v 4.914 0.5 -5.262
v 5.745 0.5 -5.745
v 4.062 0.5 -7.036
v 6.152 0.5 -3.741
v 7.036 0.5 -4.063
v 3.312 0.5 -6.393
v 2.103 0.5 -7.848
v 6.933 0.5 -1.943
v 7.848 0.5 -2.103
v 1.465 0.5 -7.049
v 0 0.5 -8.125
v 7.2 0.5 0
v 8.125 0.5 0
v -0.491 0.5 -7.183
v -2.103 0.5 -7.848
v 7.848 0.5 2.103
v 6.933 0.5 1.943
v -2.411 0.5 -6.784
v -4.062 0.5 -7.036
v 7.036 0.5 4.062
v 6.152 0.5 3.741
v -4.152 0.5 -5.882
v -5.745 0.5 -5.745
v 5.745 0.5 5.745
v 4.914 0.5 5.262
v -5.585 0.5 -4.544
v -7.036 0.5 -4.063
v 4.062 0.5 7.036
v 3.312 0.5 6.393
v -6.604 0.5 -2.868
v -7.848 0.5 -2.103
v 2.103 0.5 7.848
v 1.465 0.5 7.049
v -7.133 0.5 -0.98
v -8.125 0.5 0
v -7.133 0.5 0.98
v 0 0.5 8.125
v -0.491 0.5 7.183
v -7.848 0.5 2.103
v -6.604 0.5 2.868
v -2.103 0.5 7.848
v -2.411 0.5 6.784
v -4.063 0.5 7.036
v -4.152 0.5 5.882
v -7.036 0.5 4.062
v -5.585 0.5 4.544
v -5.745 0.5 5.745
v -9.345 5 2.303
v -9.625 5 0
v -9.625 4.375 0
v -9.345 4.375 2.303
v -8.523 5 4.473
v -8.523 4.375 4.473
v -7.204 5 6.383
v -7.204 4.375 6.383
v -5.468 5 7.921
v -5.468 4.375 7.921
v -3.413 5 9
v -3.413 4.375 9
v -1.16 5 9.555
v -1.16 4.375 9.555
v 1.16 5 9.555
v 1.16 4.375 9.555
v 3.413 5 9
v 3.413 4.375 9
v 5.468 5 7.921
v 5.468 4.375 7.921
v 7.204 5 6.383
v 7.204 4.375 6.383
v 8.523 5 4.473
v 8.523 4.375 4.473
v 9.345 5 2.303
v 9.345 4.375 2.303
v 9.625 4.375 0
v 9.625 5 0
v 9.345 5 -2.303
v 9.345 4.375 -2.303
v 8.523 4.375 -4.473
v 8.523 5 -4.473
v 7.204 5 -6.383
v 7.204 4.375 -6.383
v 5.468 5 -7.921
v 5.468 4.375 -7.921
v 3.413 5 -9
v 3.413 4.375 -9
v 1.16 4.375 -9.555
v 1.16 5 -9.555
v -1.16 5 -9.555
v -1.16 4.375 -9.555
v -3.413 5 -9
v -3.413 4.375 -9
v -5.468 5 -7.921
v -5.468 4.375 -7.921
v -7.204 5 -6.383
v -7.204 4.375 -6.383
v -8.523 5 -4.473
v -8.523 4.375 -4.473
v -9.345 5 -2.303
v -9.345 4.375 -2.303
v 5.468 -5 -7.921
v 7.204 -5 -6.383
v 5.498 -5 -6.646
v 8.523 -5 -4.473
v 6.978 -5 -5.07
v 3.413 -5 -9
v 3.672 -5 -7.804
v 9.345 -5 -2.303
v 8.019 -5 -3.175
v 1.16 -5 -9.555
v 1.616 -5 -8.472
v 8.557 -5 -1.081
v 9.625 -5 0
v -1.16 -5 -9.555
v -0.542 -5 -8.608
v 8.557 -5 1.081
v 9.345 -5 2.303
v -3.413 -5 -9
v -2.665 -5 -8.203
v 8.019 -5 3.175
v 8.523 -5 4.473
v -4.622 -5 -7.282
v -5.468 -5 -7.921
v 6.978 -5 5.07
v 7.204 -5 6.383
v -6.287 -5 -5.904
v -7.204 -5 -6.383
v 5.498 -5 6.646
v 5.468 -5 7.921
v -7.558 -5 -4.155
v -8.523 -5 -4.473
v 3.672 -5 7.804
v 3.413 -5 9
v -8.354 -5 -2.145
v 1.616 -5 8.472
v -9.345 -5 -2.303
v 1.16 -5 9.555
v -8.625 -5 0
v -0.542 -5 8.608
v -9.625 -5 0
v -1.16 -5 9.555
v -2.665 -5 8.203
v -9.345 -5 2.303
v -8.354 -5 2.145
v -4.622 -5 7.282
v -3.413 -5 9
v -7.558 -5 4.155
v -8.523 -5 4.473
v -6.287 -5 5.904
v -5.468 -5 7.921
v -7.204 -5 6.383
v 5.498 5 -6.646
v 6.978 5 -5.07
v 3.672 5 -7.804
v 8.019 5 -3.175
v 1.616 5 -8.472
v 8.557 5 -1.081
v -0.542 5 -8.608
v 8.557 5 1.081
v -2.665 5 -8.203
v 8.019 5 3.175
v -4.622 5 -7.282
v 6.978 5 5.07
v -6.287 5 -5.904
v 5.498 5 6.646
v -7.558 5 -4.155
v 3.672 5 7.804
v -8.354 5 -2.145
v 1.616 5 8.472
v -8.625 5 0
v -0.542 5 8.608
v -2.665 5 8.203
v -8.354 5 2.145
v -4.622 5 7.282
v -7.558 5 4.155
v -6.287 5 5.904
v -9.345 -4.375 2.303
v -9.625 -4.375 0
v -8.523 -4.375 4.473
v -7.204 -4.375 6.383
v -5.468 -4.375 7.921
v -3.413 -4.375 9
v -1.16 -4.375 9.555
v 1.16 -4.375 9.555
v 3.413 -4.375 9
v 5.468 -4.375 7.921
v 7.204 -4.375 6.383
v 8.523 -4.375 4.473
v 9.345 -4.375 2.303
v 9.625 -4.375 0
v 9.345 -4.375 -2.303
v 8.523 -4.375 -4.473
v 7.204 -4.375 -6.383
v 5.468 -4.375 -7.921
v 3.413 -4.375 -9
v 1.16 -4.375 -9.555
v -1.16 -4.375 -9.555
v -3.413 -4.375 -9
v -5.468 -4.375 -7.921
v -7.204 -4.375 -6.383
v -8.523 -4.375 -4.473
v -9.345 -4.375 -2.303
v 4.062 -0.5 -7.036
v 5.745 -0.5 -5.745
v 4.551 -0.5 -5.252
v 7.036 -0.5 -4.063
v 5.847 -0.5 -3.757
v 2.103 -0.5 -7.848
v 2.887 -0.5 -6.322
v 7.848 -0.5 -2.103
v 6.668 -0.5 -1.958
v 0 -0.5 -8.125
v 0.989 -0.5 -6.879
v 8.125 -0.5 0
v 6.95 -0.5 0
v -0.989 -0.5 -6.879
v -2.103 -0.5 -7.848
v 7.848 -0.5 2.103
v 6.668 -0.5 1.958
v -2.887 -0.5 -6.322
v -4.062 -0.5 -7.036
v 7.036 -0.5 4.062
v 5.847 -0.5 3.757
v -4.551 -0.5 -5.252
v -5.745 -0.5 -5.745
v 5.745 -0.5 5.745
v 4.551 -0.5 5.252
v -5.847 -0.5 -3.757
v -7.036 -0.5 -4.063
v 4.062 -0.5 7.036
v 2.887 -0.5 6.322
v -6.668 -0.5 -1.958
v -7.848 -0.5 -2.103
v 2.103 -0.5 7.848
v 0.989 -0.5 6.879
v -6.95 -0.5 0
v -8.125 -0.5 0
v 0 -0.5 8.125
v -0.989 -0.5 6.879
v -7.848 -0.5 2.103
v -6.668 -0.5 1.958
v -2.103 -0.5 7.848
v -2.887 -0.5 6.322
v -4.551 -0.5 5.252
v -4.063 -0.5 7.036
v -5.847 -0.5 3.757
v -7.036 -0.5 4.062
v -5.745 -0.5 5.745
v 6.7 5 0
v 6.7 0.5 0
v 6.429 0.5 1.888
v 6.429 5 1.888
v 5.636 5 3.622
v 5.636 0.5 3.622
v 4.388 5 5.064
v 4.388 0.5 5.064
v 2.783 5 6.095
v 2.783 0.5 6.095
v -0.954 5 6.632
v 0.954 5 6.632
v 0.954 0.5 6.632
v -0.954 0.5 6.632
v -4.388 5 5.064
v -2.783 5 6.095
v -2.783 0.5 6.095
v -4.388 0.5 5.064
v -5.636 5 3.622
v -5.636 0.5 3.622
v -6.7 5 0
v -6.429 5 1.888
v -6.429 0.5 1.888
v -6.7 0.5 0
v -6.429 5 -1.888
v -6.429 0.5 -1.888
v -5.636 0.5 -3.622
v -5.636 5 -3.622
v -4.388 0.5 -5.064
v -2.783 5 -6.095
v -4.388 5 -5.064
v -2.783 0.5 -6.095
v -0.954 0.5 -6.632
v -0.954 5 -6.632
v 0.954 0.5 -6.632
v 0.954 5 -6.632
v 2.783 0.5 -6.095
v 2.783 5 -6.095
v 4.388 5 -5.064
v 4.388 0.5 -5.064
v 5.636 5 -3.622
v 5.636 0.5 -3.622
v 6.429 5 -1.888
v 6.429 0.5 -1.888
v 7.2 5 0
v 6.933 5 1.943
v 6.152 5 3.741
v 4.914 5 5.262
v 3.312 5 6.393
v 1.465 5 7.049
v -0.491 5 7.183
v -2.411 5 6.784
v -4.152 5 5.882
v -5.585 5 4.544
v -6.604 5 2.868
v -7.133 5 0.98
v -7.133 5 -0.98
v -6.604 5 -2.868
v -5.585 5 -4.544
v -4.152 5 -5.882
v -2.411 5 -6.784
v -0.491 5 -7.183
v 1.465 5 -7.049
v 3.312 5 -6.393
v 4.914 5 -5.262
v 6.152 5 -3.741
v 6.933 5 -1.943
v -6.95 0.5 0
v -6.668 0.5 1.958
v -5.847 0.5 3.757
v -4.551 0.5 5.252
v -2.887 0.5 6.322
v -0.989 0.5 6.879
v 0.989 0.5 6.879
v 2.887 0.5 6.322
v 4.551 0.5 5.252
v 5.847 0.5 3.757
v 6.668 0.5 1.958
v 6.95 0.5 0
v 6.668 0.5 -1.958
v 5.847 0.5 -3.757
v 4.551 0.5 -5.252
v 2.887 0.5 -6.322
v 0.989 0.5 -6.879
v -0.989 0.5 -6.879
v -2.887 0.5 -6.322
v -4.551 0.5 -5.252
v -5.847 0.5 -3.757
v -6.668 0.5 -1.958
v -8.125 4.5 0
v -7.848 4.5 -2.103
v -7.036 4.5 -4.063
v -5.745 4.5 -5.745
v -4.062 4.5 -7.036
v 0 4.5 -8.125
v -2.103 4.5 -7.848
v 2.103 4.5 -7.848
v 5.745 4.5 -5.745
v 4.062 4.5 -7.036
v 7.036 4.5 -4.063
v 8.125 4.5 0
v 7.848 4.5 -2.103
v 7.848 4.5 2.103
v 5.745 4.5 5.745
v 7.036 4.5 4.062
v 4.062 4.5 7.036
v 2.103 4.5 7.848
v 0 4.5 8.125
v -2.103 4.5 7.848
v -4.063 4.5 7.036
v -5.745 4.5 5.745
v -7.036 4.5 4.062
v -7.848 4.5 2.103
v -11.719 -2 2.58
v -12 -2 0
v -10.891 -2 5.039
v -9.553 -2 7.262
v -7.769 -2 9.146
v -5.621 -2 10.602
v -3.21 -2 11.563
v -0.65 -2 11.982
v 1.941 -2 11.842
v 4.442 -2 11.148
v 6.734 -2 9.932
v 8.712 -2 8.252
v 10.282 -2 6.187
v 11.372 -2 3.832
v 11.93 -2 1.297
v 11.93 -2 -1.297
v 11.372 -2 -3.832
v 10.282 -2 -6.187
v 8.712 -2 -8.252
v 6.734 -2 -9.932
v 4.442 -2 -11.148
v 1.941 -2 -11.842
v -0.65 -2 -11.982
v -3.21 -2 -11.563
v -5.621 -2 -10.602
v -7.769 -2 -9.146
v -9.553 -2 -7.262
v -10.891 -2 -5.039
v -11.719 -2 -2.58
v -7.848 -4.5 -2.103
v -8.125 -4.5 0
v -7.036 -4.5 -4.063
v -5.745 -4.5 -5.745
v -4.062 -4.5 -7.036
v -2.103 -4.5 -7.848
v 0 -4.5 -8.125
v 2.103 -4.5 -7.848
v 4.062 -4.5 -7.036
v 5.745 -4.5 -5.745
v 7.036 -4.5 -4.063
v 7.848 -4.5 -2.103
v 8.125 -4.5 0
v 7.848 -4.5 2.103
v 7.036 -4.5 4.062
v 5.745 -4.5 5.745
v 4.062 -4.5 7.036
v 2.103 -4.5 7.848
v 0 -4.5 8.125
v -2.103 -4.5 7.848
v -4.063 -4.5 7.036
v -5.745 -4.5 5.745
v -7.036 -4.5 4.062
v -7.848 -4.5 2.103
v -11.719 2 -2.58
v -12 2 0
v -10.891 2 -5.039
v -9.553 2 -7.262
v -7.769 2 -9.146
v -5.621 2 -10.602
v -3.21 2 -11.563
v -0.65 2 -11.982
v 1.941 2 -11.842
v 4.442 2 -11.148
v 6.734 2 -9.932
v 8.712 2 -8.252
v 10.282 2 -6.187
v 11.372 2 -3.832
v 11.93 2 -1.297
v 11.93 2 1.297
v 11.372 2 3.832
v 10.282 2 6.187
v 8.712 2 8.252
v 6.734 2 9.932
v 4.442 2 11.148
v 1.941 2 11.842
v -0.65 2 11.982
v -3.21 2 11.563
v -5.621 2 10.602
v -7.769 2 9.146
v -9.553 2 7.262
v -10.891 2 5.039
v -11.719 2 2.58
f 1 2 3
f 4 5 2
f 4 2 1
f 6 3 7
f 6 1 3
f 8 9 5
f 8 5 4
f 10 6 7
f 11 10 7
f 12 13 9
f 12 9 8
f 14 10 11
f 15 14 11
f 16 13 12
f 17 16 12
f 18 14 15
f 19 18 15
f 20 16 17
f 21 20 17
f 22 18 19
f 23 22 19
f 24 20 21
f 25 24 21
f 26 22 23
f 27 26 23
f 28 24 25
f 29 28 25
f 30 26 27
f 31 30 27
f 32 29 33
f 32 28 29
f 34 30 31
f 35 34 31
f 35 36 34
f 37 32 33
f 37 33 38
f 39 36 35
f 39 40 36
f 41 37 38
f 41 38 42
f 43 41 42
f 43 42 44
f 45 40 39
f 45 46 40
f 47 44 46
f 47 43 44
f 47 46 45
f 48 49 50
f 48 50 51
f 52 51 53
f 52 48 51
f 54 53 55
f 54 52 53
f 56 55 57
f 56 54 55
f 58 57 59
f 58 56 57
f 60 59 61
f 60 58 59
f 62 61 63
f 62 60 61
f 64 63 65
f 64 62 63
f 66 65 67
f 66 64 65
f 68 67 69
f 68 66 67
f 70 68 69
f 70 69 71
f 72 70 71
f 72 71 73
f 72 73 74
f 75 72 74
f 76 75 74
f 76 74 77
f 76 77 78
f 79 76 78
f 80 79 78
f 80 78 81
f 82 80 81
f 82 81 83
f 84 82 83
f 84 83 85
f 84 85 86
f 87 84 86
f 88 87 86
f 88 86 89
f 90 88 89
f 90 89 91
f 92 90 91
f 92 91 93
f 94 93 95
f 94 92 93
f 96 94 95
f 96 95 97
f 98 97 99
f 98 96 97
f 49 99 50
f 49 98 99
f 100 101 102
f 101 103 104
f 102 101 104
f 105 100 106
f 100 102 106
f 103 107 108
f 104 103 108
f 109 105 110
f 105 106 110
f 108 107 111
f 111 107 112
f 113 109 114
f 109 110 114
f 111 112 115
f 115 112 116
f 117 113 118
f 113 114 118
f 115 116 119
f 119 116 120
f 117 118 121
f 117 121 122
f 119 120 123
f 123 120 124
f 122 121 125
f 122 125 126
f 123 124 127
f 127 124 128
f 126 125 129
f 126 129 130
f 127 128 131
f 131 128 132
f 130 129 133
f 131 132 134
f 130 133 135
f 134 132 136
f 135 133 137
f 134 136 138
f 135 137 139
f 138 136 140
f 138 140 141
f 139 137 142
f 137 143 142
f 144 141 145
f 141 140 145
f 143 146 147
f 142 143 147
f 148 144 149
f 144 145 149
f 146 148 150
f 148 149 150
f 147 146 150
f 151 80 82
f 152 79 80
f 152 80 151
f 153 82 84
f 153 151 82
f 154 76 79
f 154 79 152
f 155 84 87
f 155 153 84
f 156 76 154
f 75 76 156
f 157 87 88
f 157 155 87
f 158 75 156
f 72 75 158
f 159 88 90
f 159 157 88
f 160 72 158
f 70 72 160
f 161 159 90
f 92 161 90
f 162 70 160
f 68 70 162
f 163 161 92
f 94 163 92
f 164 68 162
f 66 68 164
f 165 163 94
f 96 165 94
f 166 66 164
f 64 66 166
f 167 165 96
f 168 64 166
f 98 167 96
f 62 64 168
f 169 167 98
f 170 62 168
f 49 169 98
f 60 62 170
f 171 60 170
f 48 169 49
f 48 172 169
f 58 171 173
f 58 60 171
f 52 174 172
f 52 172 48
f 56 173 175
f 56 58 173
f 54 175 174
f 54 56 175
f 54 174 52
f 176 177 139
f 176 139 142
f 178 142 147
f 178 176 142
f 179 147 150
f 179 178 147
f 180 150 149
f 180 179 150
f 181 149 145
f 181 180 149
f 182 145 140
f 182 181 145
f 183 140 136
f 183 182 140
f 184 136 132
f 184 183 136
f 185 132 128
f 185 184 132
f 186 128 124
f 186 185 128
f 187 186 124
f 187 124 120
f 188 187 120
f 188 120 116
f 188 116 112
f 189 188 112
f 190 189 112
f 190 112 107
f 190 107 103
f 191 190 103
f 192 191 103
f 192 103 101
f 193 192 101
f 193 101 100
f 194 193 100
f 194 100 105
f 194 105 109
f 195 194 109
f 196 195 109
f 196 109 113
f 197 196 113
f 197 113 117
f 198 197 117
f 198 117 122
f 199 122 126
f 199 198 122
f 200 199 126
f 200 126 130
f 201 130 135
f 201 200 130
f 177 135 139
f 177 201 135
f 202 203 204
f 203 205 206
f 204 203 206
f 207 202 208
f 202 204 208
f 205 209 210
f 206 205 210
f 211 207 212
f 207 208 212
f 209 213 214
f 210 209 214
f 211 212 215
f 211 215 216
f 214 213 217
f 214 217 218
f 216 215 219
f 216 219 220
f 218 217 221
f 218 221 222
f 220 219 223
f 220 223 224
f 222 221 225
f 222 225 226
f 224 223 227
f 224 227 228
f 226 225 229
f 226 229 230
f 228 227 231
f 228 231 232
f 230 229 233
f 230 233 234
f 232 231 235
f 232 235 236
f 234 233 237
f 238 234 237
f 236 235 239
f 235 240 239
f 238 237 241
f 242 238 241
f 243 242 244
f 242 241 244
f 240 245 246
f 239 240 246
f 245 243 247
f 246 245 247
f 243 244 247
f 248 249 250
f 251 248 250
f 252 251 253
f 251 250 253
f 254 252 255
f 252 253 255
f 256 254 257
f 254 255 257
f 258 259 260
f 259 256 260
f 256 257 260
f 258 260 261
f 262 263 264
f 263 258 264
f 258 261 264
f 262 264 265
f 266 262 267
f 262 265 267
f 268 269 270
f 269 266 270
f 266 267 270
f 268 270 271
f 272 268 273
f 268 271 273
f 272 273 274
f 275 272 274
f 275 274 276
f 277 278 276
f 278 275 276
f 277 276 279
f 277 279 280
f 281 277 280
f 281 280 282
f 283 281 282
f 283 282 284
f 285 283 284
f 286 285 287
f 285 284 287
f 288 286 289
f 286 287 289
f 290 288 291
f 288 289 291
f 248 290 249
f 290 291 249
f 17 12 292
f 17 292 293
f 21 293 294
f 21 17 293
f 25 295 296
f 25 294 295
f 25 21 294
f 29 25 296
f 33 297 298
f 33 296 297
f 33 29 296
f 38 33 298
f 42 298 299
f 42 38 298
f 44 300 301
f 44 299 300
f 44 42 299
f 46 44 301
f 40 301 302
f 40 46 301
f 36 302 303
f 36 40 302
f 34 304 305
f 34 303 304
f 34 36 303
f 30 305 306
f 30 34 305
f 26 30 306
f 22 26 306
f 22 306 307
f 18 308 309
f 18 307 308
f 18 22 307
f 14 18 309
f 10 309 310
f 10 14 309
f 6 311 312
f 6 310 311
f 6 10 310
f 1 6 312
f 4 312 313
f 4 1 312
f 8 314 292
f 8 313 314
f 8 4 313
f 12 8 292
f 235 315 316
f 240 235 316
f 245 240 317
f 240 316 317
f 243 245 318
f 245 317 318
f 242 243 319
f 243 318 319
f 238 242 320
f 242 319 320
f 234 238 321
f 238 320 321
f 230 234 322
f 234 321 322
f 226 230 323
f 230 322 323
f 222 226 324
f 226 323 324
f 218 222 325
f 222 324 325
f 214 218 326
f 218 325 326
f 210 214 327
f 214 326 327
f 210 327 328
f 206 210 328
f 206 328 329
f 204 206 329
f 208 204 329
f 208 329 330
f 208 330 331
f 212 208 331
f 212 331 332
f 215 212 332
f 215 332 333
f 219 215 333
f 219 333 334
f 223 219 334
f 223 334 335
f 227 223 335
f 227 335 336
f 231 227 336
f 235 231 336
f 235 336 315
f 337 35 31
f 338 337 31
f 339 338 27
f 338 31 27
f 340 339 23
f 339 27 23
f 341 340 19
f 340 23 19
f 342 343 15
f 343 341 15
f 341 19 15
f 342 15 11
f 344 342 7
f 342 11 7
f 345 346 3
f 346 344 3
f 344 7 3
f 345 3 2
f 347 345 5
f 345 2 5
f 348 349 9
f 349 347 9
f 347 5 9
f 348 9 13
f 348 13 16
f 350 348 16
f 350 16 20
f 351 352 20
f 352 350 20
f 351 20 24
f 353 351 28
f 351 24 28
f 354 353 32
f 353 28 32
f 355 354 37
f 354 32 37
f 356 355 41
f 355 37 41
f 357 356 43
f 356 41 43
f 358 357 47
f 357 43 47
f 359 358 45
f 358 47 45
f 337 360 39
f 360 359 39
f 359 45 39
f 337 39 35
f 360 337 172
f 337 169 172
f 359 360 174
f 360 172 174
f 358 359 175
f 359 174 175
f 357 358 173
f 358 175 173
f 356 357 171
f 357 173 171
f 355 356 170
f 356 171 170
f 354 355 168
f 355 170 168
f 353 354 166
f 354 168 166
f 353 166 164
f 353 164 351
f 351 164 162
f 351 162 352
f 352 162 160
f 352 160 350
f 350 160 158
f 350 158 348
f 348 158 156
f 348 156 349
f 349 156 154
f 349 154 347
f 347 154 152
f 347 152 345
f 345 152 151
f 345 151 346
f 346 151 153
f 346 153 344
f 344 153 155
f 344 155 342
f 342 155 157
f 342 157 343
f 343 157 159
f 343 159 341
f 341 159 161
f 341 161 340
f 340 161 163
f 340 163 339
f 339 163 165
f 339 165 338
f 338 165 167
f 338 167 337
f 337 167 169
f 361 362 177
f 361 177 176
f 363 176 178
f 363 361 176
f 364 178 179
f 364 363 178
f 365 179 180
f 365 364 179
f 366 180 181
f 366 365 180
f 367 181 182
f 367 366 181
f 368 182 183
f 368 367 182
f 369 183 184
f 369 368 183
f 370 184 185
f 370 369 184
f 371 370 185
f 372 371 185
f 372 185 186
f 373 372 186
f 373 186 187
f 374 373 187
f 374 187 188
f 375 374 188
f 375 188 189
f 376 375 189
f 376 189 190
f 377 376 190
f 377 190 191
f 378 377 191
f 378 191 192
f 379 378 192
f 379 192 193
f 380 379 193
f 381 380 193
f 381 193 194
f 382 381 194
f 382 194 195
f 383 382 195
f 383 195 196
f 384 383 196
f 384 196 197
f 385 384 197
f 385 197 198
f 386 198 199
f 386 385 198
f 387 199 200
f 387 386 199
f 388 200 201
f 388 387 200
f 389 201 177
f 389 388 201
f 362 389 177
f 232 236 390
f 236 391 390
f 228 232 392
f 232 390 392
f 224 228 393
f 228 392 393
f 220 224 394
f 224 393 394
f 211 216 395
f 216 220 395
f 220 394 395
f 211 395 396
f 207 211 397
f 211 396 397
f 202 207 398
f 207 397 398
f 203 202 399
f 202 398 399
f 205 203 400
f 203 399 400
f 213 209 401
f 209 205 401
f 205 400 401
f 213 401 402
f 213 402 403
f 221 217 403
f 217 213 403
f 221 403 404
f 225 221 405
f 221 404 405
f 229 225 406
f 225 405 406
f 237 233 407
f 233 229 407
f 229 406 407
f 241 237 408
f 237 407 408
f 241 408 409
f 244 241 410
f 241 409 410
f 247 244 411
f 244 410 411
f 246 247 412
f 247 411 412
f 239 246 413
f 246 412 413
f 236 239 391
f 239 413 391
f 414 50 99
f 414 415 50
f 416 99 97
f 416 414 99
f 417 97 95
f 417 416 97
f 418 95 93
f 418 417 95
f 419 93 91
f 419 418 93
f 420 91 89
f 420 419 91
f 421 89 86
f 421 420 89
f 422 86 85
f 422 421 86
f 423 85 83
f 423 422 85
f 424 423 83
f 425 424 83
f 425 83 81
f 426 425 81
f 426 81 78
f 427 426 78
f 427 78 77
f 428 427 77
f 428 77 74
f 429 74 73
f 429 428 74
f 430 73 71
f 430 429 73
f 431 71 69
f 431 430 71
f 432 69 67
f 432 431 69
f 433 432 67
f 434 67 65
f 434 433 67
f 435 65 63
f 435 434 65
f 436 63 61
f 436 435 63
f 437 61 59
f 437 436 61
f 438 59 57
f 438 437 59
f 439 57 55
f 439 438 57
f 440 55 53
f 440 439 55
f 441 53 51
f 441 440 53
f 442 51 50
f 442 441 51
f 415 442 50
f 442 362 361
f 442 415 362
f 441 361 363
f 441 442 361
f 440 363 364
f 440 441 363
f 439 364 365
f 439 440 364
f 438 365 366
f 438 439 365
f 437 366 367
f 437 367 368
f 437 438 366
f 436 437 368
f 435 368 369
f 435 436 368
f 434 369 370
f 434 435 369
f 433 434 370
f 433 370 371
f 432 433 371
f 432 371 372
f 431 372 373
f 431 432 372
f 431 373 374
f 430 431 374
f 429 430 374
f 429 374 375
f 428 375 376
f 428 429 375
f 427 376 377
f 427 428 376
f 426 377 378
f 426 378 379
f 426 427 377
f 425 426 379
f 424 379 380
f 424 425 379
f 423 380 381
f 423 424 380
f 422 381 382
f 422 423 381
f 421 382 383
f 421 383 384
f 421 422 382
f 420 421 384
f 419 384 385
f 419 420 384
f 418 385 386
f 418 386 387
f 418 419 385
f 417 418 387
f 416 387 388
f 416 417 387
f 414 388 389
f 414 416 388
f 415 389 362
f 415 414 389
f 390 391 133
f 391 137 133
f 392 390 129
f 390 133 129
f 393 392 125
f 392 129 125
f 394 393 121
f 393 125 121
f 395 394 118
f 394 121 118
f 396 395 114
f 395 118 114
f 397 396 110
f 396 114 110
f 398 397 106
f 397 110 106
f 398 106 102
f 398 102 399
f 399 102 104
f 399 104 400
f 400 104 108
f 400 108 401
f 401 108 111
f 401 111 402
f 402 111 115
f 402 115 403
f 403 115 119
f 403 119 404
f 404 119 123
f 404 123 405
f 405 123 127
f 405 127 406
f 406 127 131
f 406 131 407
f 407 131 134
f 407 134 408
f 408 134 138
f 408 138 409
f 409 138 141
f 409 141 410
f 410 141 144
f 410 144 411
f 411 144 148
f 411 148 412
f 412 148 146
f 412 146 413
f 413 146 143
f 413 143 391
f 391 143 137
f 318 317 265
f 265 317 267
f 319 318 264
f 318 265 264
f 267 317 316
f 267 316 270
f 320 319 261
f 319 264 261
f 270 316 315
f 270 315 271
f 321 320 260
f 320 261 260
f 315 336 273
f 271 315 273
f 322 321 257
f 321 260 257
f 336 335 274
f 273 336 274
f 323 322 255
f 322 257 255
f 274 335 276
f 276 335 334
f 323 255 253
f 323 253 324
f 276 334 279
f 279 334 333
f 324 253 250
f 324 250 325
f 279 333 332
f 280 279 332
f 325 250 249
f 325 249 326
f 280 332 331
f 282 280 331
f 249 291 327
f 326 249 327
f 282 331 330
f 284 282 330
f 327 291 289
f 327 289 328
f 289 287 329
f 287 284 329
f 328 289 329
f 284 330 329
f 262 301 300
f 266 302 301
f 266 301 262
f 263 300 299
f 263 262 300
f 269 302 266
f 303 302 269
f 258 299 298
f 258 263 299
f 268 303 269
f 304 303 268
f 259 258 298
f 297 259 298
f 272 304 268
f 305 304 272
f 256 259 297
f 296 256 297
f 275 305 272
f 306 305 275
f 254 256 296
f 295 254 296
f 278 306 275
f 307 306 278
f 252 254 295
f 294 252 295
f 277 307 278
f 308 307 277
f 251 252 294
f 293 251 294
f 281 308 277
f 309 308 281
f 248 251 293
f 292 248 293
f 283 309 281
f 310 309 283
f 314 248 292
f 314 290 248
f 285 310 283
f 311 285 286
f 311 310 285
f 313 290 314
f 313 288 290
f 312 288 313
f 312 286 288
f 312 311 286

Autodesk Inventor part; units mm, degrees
ref_plane "YZ Plane" through (0, 0, 0) normal (1, 0, 0) x (0, 1, 0)
ref_plane "XZ Plane" through (0, 0, 0) normal (0, 1, 0) x (-1, 0, 0)
ref_plane "XY Plane" through (0, 0, 0) normal (0, 0, 1) x (1, 0, 0)
sketch "Sketch1" plane through (0, 0, 0) normal (0, 0, 1) x (1, 0, 0)
  line L0 (0, -0.4401) -> (0, 0.4401)
  line L1 (-8.125, -0.5) -> (-6.95, -0.5)
  line L2 (-6.95, -0.5) -> (-6.95, 0.5)
  line L3 (-6.95, 0.5) -> (-8.125, 0.5)
  line L4 (-8.125, 0.5) -> (-8.125, -0.5)
  line L5 (-8.125, -0.5) -> (-6.95, 0.5) construction
  line L6 (-6.95, -0.5) -> (-8.125, 0.5) construction
  line L7 (-9.625, 5) -> (-8.125, 5)
  line L8 (-8.125, 5) -> (-8.125, -5)
  line L9 (-8.125, -5) -> (-9.625, -5)
  line L10 (-9.625, -5) -> (-9.625, 5)
  line L11 (-9.625, 5) -> (-8.125, -5) construction
  line L12 (-8.125, 5) -> (-9.625, -5) construction
  line L13 (-9.625, -4.375) -> (-12, -2)
  line L14 (-12, -2) -> (-12, 2)
  line L15 (-12, 2) -> (-9.625, 4.375)
  line L16 (-8, 0.5) -> (8, 0.5) construction
  line L17 (8, 0.5) -> (8, 5.5) construction
  line L18 (8, 5.5) -> (-8, 5.5) construction
  line L19 (-8, 5.5) -> (-8, 0.5) construction
  line L20 (-8, 0.5) -> (8, 5.5) construction
  line L21 (8, 0.5) -> (-8, 5.5) construction
  line L22 (-17, -3) -> (-11, -3) construction
  line L23 (-11, -3) -> (-11, 3) construction
  line L24 (-11, 3) -> (-17, 3) construction
  line L25 (-17, 3) -> (-17, -3) construction
  line L26 (-17, -3) -> (-11, 3) construction
  line L27 (-11, -3) -> (-17, 3) construction
  point P0 (0, 0)
  point P1 (0, 0)
  point P2 (-7.5375, 0)
  point P3 (-8.875, 0)
  point P4 (-12, 0)
  point P5 (-7.5375, 0)
  point P6 (-8.875, 0)
  point P7 (0, 3)
  point P8 (0, 3)
  point P9 (-14, 0)
  point P10 (-8.125, 0.5)
  point P11 (-8.125, -0.5)
  dimension "d0" = 13.9
  dimension "d1" = 16.25
  dimension "d2" = 10
  dimension "d3" = 16
  dimension "d4" = 5
  dimension "d5" = 5.5
  dimension "d6" = 45
  dimension "d7" = 4
  dimension "d8" = 2.375
  dimension "d9" = 1.5
  dimension "d10" = 6
  dimension "d11" = 6
  dimension "d12" = 22
revolve "Revolution1" add sketch "Sketch1" angle 360 about axis through (0, -0.4401, 0) along (0, 1, 0)
chamfer "Chamfer1" distance 0.5 angle 45 2 edges at (8.125, 5, 0) (8.125, -5, 0)
sketch "Sketch2" plane through (0, 0.5, 0) normal (0, 1, 0) x (1, 0, 0)
  circle A0 centre (0, 0) radius 6.95 construction
  circle A1 centre (0, 0) radius 7.2
  circle A2 centre (0, 0) radius 6.7
  point P0 (0, 0)
  dimension "d17" = 0.25
  dimension "d18" = 0.25
extrude "Extrusion1" add sketch "Sketch2" along normal up to surface (4.5 mm away)
properties part number "Internal_V-groove_Bearing"
